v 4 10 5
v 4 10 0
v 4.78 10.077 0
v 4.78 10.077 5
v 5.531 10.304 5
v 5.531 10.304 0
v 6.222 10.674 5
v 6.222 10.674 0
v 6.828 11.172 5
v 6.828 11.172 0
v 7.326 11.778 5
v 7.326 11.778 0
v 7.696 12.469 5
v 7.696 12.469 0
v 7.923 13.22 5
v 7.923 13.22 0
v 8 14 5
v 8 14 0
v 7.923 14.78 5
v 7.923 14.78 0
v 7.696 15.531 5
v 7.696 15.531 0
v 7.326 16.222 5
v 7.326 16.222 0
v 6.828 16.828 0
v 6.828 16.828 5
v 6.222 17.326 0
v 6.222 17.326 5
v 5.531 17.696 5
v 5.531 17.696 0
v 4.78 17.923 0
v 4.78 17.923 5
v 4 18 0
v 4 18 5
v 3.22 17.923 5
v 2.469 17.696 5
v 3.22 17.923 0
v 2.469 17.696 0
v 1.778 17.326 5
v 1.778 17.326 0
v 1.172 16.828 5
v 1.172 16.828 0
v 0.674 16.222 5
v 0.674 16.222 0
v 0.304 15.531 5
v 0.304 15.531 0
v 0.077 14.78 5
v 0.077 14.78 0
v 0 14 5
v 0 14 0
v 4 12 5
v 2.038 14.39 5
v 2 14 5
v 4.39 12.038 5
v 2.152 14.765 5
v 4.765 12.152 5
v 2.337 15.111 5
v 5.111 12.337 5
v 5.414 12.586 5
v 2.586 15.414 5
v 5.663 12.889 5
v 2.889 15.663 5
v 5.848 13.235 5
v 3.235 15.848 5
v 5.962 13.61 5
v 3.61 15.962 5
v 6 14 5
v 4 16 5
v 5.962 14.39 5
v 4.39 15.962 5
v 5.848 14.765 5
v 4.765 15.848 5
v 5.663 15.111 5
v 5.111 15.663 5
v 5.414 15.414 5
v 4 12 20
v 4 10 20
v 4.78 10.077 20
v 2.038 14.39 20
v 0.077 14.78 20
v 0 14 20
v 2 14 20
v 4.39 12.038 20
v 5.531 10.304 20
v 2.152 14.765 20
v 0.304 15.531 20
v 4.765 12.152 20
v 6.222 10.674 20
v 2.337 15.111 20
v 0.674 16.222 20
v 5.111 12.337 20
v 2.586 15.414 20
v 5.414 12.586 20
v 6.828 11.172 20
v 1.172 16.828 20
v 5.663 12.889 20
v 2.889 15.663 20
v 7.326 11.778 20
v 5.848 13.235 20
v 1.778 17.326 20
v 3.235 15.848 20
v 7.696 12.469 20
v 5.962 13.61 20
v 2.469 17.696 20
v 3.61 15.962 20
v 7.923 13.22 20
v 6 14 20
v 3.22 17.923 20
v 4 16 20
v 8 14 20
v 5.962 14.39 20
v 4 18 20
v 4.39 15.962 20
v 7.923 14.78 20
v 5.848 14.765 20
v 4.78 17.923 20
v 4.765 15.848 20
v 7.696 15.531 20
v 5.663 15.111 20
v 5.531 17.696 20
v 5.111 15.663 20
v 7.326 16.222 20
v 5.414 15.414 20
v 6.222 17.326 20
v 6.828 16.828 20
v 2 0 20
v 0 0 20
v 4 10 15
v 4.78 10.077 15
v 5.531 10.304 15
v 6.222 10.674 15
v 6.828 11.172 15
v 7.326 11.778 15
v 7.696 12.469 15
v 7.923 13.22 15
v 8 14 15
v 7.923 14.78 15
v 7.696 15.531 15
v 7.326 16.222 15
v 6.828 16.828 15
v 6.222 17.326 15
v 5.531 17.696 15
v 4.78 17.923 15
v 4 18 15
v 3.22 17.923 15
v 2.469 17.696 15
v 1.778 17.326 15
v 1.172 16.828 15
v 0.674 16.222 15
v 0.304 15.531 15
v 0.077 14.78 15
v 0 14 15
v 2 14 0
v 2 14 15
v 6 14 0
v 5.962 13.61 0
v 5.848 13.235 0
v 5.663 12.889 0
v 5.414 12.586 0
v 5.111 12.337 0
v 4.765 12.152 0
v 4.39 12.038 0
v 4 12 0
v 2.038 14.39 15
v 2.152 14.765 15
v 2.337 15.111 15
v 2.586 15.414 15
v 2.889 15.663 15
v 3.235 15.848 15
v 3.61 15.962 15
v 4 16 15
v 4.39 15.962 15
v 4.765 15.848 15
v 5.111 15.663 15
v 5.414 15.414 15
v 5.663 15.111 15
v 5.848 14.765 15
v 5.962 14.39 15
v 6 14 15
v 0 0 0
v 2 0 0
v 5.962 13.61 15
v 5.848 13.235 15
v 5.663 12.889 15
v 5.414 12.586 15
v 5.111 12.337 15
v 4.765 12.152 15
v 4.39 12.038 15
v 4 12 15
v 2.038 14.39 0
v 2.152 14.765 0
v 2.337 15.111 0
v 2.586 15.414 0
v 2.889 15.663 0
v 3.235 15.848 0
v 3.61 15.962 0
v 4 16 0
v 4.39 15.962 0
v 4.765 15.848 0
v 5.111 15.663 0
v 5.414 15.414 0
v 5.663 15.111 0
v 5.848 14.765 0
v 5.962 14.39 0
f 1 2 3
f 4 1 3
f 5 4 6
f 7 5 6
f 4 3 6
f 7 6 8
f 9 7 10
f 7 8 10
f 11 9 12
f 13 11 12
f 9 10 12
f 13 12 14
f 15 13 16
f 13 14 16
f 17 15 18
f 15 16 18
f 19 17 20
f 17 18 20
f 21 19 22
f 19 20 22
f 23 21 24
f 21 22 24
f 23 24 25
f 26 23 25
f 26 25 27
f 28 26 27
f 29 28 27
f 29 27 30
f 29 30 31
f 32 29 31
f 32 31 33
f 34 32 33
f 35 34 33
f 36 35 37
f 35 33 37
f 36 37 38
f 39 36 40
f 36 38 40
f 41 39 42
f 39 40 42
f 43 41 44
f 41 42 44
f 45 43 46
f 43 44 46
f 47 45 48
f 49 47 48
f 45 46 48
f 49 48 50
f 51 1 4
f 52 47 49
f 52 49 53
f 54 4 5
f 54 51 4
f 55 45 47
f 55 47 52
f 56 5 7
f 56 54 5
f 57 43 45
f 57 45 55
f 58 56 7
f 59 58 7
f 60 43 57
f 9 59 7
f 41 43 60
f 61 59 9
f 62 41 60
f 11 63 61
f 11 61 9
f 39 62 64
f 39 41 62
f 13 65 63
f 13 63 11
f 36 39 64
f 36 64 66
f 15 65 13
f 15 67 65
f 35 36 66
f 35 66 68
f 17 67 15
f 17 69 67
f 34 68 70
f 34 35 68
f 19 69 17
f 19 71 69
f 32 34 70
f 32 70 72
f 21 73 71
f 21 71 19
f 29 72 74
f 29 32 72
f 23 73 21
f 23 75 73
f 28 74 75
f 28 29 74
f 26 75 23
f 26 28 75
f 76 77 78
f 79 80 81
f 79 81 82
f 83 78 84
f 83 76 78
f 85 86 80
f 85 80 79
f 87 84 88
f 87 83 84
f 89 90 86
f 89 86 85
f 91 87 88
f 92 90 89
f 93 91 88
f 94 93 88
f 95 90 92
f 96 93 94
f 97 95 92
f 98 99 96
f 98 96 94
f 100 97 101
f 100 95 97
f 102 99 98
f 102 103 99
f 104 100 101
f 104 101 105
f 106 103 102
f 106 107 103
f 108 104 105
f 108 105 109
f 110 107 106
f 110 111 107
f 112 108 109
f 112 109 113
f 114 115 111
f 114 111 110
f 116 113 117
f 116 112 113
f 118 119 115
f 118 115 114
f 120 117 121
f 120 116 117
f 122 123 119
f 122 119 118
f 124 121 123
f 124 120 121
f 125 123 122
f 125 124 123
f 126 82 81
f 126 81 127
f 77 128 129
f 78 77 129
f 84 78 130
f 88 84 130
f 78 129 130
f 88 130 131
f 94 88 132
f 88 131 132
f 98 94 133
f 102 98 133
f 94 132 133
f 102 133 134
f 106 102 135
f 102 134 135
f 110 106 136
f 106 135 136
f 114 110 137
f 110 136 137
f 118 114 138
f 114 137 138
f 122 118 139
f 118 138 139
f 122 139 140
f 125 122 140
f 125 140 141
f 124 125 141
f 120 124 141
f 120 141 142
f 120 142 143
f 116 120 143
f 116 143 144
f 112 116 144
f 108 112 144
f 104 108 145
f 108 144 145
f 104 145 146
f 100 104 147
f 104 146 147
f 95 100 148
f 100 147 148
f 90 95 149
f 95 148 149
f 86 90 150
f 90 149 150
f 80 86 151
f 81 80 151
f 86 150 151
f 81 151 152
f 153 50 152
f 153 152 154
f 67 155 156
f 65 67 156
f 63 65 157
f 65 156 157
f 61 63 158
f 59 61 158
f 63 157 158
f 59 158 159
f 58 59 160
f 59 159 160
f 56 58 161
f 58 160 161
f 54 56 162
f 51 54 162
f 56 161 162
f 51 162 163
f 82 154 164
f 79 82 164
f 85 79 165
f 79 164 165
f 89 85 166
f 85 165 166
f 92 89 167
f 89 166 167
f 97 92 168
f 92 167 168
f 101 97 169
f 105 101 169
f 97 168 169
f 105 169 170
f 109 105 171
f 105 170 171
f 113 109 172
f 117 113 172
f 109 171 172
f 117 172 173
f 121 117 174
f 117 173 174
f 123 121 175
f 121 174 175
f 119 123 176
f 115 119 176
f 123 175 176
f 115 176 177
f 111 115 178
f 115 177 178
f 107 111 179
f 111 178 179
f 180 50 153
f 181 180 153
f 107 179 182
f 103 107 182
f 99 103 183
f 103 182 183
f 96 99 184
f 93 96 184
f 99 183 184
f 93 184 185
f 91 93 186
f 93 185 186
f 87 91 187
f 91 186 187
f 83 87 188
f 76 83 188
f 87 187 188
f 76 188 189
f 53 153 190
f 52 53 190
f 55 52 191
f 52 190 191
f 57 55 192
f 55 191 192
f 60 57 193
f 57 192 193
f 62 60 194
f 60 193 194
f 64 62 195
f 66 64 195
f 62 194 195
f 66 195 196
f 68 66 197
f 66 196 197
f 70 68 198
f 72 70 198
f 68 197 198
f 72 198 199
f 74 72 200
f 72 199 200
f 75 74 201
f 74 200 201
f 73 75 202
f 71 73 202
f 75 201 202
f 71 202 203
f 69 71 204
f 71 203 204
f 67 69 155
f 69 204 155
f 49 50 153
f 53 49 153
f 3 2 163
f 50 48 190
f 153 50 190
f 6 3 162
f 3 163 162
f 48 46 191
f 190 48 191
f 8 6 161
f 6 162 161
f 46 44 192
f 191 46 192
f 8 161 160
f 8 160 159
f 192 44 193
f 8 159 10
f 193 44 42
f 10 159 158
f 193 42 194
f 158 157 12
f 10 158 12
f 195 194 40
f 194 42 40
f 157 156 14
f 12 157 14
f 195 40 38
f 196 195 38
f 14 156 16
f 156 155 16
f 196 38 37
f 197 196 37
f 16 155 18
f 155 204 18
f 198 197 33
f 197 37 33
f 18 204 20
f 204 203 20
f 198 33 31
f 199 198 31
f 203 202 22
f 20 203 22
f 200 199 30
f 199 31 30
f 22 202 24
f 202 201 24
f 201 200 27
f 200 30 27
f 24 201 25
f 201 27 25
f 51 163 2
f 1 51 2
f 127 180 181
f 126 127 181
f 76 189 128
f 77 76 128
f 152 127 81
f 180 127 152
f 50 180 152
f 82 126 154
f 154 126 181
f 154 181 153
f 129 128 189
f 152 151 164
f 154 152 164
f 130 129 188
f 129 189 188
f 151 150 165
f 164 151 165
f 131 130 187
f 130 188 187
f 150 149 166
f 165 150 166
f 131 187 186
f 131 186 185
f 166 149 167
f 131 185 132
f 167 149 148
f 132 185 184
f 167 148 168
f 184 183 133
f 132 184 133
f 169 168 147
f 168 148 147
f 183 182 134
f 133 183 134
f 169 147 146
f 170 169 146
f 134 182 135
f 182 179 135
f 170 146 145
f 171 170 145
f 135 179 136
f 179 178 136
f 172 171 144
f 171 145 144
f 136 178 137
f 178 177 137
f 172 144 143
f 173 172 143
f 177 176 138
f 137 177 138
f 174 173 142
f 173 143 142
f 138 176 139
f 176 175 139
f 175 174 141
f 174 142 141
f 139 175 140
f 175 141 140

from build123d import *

# Parameters (mm, degrees)
BOSS_EXTRUDE1_DEPTH = 20
BOSS_EXTRUDE2_DEPTH = 5
BOSS_EXTRUDE3_START = 15
BOSS_EXTRUDE3_DEPTH = 5


with BuildPart() as part:
    # Sketch2 → Boss-Extrude1 (new body)
    with BuildSketch(Plane.XY):
        Polygon((0, 14), (0, 0), (2, 0), (2, 10.535898385), (2, 14), align=None)
    extrude(amount=BOSS_EXTRUDE1_DEPTH)

    # Sketch2<6> → Boss-Extrude3 (add)
    with BuildSketch(Plane.XY.offset(BOSS_EXTRUDE3_START)):
        with BuildLine():
            ThreePointArc((4, 10), (6.828427125, 16.828427125), (0, 14))
            Line((0, 14), (2, 14))
            ThreePointArc((2, 14), (4, 16), (6, 14))
            ThreePointArc((6, 14), (5.414213562, 12.585786438), (4, 12))
            Line((4, 12), (4, 10))
        make_face()
    extrude(amount=BOSS_EXTRUDE3_DEPTH)


with BuildPart() as body_2:
    # Sketch2<5> → Boss-Extrude2 (new body)
    with BuildSketch(Plane.XY):
        with BuildLine():
            ThreePointArc((4, 10), (6.828427125, 16.828427125), (0, 14))
            Line((0, 14), (2, 14))
            ThreePointArc((2, 14), (4, 16), (6, 14))
            ThreePointArc((6, 14), (5.414213562, 12.585786438), (4, 12))
            Line((4, 12), (4, 10))
        make_face()
    extrude(amount=BOSS_EXTRUDE2_DEPTH)


solid = Compound([part.part, body_2.part])
